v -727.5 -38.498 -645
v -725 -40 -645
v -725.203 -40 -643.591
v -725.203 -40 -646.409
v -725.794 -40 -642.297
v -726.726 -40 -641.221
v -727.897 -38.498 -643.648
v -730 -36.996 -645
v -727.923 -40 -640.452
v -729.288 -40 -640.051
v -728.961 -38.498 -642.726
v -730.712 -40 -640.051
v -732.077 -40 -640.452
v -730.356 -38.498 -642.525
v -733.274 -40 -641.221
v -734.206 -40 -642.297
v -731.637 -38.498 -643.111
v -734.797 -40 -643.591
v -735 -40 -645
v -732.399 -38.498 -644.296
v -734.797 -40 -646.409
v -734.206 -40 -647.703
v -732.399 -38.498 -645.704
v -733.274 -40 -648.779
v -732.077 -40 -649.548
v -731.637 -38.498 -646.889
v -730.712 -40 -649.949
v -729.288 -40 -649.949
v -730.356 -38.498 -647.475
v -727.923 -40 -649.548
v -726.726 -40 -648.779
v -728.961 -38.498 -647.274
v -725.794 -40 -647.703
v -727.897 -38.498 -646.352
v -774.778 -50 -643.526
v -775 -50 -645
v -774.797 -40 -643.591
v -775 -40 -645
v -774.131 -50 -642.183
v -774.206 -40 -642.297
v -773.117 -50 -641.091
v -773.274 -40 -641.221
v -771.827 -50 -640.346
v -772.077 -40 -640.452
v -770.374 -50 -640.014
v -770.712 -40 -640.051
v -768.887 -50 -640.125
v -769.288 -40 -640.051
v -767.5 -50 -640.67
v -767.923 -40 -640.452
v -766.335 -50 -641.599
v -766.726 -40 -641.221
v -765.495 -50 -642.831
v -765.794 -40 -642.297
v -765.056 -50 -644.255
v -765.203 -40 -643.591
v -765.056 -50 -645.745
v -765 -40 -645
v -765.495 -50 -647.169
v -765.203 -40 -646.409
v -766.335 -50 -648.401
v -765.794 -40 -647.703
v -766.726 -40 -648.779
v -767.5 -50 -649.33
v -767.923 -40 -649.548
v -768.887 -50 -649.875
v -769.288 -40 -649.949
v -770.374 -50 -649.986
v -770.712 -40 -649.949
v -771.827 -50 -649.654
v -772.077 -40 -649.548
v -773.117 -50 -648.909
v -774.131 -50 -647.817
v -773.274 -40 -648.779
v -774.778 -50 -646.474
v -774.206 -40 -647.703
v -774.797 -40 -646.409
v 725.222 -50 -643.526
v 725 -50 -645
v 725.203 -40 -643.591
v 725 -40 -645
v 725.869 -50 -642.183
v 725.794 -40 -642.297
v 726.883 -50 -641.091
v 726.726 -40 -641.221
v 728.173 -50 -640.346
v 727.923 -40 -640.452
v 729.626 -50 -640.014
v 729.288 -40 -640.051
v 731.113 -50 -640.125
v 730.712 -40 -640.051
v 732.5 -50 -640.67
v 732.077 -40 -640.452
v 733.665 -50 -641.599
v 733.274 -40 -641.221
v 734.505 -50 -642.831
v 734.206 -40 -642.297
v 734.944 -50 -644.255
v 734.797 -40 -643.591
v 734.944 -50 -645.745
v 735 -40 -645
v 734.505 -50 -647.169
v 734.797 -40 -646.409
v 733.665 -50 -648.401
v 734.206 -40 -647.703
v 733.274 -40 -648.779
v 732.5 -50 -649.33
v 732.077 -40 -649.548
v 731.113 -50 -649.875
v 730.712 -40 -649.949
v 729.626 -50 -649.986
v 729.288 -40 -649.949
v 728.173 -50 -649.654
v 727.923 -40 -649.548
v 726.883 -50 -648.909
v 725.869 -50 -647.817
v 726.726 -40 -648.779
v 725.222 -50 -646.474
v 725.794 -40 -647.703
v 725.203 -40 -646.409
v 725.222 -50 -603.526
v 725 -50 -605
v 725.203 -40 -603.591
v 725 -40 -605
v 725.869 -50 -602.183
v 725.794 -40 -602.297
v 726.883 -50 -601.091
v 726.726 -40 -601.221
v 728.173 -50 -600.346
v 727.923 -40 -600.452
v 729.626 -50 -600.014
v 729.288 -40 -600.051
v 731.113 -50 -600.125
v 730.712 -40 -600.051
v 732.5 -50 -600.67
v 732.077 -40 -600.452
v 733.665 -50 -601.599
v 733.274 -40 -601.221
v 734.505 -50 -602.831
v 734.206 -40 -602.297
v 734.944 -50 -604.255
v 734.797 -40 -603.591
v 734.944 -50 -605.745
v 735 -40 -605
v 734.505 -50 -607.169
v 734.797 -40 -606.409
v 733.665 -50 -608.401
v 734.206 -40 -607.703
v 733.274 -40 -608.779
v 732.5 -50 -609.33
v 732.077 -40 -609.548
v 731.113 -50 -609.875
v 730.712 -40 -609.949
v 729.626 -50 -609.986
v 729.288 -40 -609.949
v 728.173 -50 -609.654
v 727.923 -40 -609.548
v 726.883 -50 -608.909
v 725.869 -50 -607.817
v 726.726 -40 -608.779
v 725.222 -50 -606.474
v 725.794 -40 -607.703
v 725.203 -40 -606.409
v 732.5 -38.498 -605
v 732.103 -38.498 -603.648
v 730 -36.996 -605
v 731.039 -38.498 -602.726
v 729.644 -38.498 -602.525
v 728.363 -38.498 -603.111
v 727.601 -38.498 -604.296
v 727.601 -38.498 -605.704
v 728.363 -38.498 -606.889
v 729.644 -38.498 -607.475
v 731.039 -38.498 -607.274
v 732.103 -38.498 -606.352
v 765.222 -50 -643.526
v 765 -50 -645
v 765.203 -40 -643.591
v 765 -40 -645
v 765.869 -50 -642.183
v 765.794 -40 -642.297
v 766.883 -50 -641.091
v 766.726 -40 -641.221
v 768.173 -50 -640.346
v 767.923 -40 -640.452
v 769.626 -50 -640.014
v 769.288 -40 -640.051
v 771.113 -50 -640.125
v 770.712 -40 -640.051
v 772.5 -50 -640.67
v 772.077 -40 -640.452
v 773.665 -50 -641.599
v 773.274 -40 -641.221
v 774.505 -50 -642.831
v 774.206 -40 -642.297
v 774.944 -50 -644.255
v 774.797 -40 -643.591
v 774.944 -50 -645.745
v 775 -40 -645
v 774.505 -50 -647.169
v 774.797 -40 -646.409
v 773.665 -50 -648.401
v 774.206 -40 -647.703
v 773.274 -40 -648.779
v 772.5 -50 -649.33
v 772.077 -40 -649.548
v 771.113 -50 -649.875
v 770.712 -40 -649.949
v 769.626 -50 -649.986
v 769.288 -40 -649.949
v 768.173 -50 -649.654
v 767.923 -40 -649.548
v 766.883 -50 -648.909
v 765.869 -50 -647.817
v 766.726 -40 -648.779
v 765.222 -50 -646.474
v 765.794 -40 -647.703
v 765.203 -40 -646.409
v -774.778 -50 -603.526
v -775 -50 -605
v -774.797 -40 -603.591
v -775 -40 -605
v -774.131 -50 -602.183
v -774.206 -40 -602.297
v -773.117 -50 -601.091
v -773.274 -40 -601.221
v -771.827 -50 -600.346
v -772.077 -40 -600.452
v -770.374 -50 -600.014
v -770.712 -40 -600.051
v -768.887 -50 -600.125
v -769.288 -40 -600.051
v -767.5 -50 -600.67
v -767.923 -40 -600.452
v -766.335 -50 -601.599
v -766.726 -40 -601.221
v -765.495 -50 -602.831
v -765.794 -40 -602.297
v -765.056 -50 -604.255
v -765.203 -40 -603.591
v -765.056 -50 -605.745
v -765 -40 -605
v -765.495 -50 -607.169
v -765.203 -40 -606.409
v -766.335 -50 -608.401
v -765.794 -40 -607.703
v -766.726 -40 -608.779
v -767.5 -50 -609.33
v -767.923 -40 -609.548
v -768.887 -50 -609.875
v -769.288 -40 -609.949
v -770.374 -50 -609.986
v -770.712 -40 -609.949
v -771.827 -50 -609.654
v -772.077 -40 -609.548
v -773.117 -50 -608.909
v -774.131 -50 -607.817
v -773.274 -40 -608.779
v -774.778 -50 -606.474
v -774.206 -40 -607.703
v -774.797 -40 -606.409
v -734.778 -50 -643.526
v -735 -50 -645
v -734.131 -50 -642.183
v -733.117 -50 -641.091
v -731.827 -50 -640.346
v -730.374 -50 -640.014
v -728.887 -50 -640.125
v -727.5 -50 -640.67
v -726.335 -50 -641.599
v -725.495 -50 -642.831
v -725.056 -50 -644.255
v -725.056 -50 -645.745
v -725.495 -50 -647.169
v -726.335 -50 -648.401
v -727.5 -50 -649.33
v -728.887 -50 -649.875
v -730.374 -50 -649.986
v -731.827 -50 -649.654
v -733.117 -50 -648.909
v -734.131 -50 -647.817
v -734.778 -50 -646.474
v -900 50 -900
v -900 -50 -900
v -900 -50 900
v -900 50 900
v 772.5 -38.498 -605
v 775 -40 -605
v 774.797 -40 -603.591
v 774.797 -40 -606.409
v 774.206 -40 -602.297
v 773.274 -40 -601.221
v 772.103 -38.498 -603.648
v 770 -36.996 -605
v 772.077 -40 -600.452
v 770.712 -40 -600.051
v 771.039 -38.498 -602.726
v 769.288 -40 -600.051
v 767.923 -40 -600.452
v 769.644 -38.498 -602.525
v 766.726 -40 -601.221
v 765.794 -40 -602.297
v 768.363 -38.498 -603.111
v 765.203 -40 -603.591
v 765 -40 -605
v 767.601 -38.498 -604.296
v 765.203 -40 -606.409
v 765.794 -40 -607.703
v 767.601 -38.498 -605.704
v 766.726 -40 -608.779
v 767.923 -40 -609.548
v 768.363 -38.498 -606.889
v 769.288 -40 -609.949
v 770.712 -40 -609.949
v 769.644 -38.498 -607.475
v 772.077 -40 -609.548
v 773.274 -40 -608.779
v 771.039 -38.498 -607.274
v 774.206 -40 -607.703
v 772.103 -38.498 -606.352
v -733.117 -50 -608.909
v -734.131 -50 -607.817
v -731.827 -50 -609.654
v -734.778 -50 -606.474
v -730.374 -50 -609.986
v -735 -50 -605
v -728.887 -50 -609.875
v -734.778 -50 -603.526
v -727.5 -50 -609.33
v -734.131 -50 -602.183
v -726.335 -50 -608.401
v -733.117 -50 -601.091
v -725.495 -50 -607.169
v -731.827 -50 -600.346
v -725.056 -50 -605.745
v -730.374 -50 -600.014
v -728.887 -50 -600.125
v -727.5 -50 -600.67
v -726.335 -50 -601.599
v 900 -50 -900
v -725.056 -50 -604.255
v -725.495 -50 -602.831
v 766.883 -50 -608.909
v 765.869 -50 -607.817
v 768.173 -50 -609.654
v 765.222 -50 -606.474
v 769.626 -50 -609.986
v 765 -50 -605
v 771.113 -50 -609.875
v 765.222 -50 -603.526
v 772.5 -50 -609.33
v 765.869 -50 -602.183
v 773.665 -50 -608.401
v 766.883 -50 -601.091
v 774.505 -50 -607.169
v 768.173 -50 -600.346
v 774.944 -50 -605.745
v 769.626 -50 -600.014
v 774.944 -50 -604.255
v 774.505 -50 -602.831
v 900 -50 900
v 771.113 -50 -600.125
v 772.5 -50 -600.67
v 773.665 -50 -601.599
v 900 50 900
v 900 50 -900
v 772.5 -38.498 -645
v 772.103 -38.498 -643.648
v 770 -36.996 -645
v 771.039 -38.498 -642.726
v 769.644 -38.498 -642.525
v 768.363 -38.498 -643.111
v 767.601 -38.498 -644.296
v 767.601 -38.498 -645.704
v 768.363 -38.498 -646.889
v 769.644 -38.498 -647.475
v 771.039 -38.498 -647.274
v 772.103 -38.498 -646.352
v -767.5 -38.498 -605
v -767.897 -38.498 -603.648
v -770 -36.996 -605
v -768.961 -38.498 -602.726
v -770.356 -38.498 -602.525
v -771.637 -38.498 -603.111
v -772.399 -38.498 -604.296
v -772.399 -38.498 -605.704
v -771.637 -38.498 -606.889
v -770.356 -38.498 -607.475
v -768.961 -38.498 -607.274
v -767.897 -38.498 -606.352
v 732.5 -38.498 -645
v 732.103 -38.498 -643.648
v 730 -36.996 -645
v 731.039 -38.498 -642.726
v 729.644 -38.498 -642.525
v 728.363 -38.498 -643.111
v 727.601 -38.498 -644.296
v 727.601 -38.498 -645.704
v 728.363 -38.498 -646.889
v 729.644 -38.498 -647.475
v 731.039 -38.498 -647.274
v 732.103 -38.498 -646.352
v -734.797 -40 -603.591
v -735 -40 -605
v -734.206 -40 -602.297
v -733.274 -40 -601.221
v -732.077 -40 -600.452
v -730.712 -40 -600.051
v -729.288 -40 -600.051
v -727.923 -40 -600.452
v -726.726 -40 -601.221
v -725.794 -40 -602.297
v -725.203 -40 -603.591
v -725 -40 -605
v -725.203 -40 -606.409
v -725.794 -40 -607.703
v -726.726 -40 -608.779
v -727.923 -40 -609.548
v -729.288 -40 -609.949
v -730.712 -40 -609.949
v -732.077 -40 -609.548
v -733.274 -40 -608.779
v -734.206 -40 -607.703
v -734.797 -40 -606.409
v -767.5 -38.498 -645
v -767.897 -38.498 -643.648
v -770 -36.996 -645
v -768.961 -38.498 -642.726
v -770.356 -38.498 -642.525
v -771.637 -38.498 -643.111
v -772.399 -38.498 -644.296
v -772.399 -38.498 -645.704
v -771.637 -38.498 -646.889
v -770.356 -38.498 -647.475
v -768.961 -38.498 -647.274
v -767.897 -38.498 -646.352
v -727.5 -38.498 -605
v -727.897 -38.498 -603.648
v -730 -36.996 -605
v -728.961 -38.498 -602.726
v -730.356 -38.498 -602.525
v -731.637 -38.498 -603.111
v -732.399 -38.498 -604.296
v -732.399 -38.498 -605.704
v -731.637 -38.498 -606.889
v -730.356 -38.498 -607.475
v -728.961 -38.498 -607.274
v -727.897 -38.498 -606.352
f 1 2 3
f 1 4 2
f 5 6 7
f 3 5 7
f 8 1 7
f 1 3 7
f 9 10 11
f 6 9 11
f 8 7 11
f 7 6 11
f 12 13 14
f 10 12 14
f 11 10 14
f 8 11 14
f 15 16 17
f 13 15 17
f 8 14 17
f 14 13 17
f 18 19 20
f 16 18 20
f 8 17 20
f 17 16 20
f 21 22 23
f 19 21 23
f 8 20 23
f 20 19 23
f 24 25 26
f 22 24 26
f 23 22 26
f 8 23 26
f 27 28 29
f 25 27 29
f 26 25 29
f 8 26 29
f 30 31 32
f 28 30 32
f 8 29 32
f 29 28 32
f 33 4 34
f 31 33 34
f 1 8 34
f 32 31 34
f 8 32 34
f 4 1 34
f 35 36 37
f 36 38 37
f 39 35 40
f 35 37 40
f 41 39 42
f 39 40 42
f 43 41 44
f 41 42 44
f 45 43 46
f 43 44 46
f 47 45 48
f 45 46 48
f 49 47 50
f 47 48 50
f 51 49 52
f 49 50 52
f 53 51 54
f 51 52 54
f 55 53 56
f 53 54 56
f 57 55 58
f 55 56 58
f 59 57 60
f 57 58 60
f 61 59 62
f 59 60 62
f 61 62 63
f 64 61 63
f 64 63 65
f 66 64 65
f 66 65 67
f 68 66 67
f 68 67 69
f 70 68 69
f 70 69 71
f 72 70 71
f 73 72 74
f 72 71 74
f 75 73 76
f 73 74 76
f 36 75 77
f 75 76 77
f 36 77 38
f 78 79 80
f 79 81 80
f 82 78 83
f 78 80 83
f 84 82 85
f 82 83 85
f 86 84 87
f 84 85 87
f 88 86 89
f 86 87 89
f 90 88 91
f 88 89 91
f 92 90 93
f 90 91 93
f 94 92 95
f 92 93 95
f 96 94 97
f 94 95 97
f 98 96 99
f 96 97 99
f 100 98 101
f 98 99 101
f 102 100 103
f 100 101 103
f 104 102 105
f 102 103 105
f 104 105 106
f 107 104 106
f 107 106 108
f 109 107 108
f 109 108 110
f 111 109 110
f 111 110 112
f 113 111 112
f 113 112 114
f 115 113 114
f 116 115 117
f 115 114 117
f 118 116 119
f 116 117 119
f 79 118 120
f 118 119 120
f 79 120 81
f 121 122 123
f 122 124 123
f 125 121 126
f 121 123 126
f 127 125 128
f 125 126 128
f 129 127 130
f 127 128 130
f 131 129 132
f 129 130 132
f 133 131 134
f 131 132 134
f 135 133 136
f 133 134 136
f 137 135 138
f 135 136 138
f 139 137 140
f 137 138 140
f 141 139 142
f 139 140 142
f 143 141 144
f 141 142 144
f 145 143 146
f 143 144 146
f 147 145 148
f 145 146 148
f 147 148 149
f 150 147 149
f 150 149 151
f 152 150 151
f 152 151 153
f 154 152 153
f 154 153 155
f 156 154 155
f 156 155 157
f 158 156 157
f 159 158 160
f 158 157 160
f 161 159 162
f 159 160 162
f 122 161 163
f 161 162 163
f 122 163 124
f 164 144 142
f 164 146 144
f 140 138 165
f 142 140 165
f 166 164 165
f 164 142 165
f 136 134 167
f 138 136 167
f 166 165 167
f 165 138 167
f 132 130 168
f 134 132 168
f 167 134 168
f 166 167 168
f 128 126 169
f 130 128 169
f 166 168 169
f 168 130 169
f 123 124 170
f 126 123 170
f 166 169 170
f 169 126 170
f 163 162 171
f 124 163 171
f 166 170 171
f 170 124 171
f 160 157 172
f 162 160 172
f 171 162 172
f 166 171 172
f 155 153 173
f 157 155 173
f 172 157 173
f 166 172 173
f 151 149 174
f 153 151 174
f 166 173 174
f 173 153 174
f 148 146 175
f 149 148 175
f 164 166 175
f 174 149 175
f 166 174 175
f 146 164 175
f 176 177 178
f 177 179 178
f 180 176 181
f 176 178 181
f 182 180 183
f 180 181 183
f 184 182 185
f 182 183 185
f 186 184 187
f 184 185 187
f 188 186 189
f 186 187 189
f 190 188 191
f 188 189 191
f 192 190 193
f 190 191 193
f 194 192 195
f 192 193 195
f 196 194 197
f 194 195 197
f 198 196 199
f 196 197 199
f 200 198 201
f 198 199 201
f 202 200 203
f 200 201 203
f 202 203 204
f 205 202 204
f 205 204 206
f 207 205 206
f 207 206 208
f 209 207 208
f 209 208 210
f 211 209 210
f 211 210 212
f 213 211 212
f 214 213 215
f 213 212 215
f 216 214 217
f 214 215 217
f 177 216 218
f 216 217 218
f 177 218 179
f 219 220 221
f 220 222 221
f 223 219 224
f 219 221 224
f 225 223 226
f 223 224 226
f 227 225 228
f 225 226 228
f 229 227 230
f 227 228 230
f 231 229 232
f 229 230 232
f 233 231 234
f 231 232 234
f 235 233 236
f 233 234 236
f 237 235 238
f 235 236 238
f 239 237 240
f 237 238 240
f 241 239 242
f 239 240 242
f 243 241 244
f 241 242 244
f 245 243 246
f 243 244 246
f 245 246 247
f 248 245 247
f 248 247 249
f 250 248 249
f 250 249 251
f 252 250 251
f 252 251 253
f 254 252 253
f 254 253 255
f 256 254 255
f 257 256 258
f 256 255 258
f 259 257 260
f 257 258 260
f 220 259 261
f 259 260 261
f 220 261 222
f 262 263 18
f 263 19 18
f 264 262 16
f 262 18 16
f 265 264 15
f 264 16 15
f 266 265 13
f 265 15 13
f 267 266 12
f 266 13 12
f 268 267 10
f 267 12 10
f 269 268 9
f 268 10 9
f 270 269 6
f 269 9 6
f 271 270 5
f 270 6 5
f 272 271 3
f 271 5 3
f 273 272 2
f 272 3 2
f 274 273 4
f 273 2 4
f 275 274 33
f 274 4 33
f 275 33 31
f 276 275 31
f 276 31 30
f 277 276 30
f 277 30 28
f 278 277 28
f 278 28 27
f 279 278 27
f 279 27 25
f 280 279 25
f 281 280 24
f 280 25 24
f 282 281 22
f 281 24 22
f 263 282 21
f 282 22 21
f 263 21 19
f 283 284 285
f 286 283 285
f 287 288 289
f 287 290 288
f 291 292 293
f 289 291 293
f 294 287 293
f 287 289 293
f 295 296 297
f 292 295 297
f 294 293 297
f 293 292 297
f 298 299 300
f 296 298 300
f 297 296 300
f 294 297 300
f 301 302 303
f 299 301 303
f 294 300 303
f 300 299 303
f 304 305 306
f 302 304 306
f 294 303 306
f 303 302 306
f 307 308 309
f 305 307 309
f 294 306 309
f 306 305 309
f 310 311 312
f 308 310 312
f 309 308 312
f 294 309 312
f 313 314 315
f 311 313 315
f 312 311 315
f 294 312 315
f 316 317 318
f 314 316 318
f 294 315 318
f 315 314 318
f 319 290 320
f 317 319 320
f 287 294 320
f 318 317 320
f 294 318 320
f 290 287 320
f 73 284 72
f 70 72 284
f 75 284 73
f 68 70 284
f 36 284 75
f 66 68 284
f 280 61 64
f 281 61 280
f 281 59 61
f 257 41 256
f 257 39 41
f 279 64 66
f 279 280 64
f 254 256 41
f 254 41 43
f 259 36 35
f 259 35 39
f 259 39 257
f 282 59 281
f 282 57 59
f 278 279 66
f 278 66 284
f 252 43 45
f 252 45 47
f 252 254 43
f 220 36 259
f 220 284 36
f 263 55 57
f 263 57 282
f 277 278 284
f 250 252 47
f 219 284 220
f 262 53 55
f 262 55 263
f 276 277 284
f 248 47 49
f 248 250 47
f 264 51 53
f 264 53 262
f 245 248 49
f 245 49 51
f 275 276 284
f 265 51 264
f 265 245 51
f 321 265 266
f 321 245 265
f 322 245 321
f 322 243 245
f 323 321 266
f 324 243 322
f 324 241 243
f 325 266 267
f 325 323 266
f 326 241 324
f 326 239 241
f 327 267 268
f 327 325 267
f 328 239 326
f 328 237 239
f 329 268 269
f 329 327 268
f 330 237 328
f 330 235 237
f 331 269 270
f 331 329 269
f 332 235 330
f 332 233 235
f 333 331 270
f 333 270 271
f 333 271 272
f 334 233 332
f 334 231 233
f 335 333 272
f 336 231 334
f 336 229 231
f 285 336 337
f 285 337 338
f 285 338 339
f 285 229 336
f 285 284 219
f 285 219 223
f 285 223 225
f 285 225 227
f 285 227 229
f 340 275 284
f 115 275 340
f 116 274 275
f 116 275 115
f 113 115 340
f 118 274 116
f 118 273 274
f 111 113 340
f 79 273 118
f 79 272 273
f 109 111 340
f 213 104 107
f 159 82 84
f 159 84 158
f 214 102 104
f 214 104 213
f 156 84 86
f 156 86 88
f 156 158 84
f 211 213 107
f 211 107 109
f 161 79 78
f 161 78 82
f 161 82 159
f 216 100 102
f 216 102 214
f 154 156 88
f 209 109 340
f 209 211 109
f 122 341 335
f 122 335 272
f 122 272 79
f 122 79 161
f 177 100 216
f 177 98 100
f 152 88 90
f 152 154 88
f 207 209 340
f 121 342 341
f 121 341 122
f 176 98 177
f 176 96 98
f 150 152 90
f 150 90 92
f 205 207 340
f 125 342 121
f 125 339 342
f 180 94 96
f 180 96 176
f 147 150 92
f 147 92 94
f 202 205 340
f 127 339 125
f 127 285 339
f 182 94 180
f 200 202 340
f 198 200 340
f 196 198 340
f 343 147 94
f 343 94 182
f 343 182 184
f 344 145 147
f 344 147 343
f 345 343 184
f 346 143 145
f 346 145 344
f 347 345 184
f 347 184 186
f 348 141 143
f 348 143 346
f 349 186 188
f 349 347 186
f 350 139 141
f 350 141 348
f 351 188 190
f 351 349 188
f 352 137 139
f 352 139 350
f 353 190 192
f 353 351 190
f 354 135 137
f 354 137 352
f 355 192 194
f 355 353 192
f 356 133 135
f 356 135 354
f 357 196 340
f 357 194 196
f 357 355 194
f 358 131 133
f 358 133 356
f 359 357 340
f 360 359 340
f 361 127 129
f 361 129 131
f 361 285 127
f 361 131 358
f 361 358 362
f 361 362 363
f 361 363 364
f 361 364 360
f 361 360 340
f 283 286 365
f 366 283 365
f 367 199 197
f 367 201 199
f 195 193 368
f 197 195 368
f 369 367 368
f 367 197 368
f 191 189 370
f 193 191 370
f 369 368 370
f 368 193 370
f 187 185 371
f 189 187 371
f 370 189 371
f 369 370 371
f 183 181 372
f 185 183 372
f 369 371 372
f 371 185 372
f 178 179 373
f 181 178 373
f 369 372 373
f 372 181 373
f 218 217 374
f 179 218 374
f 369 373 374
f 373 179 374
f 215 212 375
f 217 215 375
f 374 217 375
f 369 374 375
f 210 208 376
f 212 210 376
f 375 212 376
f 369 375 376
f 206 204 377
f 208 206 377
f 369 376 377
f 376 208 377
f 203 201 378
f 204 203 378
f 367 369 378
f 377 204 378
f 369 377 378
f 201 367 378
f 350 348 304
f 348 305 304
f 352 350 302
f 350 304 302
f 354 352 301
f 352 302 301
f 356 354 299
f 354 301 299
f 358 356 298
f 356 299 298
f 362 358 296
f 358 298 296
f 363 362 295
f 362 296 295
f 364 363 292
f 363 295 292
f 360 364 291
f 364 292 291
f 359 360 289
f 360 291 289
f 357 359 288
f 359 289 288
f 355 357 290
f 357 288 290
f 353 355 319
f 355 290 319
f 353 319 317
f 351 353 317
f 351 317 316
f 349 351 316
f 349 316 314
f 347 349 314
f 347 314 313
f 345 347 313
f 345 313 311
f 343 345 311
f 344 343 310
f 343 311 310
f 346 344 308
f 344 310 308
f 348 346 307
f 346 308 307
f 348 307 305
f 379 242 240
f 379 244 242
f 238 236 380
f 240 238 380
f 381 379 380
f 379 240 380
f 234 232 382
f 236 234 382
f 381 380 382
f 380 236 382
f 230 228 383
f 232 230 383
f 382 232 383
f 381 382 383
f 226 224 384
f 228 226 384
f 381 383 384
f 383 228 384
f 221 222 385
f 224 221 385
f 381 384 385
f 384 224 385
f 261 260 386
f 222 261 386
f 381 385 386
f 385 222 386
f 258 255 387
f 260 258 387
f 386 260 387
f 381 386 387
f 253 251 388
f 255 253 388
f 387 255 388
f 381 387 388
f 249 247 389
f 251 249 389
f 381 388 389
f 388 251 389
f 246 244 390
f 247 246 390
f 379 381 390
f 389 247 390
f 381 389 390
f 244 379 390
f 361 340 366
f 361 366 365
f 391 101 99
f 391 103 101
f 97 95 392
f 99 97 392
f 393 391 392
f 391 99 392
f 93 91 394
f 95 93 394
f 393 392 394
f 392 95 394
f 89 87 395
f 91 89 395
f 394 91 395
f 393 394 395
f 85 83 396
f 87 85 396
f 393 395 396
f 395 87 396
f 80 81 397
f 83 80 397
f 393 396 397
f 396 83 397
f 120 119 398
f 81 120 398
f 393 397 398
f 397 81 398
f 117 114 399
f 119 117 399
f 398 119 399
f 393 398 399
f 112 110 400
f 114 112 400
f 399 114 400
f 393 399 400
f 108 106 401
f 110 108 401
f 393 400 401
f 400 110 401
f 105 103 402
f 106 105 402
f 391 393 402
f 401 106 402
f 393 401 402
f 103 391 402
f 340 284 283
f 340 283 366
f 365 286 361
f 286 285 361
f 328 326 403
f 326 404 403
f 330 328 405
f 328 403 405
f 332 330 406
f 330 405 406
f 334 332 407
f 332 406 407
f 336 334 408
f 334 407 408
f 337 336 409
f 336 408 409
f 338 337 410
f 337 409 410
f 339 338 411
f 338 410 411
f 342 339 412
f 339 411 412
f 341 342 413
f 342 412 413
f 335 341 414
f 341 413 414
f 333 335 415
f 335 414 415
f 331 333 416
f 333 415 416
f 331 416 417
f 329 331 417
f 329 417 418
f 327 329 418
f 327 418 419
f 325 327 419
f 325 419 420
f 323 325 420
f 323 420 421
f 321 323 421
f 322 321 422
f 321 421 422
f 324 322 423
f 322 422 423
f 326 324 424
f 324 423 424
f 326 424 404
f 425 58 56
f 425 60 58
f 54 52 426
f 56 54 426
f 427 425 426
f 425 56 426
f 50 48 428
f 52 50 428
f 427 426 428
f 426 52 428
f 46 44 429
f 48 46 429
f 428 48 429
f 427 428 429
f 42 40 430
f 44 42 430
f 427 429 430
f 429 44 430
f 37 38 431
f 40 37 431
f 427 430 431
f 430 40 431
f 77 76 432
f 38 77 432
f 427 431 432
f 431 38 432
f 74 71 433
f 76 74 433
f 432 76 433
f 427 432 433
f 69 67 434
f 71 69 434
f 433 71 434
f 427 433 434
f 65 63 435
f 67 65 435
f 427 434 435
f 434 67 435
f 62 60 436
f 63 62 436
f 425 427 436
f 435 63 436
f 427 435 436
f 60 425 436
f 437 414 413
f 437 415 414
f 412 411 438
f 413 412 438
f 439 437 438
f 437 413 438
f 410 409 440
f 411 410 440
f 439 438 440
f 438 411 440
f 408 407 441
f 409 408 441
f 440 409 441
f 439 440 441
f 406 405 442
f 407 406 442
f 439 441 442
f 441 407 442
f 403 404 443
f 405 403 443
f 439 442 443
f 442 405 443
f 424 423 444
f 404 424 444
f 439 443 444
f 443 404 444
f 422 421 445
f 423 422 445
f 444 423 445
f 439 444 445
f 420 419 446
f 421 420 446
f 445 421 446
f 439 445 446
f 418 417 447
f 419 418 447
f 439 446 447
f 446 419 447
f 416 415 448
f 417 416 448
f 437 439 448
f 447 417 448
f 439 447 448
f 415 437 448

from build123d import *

# Parameters (mm, degrees)
F0_W     = 1800
F0_H     = 1800
F1_DEPTH = 50
F3_D     = 10
F3_DEPTH = 10
F3_TIP   = 3.0043030951


with BuildPart() as f1:
    # F0 (on Front) → F1 (new body, symmetric)
    with BuildSketch(Plane.XZ):
        Rectangle(F0_W, F0_H)
    extrude(amount=F1_DEPTH, both=True)

    # F3
    with Locations(Plane.XZ.offset(50)):
        with Locations((-770, -605), (-730, -605), (-730, -645), (-770, -645), (730, -605), (770, -605), (770, -645), (730, -645)):
            Hole(F3_D / 2, depth=F3_DEPTH)
            with Locations((0, 0, -(F3_DEPTH + F3_TIP / 2))):  # 118° drill point
                Cone(0, F3_D / 2, F3_TIP, mode=Mode.SUBTRACT)


solid = f1.part
